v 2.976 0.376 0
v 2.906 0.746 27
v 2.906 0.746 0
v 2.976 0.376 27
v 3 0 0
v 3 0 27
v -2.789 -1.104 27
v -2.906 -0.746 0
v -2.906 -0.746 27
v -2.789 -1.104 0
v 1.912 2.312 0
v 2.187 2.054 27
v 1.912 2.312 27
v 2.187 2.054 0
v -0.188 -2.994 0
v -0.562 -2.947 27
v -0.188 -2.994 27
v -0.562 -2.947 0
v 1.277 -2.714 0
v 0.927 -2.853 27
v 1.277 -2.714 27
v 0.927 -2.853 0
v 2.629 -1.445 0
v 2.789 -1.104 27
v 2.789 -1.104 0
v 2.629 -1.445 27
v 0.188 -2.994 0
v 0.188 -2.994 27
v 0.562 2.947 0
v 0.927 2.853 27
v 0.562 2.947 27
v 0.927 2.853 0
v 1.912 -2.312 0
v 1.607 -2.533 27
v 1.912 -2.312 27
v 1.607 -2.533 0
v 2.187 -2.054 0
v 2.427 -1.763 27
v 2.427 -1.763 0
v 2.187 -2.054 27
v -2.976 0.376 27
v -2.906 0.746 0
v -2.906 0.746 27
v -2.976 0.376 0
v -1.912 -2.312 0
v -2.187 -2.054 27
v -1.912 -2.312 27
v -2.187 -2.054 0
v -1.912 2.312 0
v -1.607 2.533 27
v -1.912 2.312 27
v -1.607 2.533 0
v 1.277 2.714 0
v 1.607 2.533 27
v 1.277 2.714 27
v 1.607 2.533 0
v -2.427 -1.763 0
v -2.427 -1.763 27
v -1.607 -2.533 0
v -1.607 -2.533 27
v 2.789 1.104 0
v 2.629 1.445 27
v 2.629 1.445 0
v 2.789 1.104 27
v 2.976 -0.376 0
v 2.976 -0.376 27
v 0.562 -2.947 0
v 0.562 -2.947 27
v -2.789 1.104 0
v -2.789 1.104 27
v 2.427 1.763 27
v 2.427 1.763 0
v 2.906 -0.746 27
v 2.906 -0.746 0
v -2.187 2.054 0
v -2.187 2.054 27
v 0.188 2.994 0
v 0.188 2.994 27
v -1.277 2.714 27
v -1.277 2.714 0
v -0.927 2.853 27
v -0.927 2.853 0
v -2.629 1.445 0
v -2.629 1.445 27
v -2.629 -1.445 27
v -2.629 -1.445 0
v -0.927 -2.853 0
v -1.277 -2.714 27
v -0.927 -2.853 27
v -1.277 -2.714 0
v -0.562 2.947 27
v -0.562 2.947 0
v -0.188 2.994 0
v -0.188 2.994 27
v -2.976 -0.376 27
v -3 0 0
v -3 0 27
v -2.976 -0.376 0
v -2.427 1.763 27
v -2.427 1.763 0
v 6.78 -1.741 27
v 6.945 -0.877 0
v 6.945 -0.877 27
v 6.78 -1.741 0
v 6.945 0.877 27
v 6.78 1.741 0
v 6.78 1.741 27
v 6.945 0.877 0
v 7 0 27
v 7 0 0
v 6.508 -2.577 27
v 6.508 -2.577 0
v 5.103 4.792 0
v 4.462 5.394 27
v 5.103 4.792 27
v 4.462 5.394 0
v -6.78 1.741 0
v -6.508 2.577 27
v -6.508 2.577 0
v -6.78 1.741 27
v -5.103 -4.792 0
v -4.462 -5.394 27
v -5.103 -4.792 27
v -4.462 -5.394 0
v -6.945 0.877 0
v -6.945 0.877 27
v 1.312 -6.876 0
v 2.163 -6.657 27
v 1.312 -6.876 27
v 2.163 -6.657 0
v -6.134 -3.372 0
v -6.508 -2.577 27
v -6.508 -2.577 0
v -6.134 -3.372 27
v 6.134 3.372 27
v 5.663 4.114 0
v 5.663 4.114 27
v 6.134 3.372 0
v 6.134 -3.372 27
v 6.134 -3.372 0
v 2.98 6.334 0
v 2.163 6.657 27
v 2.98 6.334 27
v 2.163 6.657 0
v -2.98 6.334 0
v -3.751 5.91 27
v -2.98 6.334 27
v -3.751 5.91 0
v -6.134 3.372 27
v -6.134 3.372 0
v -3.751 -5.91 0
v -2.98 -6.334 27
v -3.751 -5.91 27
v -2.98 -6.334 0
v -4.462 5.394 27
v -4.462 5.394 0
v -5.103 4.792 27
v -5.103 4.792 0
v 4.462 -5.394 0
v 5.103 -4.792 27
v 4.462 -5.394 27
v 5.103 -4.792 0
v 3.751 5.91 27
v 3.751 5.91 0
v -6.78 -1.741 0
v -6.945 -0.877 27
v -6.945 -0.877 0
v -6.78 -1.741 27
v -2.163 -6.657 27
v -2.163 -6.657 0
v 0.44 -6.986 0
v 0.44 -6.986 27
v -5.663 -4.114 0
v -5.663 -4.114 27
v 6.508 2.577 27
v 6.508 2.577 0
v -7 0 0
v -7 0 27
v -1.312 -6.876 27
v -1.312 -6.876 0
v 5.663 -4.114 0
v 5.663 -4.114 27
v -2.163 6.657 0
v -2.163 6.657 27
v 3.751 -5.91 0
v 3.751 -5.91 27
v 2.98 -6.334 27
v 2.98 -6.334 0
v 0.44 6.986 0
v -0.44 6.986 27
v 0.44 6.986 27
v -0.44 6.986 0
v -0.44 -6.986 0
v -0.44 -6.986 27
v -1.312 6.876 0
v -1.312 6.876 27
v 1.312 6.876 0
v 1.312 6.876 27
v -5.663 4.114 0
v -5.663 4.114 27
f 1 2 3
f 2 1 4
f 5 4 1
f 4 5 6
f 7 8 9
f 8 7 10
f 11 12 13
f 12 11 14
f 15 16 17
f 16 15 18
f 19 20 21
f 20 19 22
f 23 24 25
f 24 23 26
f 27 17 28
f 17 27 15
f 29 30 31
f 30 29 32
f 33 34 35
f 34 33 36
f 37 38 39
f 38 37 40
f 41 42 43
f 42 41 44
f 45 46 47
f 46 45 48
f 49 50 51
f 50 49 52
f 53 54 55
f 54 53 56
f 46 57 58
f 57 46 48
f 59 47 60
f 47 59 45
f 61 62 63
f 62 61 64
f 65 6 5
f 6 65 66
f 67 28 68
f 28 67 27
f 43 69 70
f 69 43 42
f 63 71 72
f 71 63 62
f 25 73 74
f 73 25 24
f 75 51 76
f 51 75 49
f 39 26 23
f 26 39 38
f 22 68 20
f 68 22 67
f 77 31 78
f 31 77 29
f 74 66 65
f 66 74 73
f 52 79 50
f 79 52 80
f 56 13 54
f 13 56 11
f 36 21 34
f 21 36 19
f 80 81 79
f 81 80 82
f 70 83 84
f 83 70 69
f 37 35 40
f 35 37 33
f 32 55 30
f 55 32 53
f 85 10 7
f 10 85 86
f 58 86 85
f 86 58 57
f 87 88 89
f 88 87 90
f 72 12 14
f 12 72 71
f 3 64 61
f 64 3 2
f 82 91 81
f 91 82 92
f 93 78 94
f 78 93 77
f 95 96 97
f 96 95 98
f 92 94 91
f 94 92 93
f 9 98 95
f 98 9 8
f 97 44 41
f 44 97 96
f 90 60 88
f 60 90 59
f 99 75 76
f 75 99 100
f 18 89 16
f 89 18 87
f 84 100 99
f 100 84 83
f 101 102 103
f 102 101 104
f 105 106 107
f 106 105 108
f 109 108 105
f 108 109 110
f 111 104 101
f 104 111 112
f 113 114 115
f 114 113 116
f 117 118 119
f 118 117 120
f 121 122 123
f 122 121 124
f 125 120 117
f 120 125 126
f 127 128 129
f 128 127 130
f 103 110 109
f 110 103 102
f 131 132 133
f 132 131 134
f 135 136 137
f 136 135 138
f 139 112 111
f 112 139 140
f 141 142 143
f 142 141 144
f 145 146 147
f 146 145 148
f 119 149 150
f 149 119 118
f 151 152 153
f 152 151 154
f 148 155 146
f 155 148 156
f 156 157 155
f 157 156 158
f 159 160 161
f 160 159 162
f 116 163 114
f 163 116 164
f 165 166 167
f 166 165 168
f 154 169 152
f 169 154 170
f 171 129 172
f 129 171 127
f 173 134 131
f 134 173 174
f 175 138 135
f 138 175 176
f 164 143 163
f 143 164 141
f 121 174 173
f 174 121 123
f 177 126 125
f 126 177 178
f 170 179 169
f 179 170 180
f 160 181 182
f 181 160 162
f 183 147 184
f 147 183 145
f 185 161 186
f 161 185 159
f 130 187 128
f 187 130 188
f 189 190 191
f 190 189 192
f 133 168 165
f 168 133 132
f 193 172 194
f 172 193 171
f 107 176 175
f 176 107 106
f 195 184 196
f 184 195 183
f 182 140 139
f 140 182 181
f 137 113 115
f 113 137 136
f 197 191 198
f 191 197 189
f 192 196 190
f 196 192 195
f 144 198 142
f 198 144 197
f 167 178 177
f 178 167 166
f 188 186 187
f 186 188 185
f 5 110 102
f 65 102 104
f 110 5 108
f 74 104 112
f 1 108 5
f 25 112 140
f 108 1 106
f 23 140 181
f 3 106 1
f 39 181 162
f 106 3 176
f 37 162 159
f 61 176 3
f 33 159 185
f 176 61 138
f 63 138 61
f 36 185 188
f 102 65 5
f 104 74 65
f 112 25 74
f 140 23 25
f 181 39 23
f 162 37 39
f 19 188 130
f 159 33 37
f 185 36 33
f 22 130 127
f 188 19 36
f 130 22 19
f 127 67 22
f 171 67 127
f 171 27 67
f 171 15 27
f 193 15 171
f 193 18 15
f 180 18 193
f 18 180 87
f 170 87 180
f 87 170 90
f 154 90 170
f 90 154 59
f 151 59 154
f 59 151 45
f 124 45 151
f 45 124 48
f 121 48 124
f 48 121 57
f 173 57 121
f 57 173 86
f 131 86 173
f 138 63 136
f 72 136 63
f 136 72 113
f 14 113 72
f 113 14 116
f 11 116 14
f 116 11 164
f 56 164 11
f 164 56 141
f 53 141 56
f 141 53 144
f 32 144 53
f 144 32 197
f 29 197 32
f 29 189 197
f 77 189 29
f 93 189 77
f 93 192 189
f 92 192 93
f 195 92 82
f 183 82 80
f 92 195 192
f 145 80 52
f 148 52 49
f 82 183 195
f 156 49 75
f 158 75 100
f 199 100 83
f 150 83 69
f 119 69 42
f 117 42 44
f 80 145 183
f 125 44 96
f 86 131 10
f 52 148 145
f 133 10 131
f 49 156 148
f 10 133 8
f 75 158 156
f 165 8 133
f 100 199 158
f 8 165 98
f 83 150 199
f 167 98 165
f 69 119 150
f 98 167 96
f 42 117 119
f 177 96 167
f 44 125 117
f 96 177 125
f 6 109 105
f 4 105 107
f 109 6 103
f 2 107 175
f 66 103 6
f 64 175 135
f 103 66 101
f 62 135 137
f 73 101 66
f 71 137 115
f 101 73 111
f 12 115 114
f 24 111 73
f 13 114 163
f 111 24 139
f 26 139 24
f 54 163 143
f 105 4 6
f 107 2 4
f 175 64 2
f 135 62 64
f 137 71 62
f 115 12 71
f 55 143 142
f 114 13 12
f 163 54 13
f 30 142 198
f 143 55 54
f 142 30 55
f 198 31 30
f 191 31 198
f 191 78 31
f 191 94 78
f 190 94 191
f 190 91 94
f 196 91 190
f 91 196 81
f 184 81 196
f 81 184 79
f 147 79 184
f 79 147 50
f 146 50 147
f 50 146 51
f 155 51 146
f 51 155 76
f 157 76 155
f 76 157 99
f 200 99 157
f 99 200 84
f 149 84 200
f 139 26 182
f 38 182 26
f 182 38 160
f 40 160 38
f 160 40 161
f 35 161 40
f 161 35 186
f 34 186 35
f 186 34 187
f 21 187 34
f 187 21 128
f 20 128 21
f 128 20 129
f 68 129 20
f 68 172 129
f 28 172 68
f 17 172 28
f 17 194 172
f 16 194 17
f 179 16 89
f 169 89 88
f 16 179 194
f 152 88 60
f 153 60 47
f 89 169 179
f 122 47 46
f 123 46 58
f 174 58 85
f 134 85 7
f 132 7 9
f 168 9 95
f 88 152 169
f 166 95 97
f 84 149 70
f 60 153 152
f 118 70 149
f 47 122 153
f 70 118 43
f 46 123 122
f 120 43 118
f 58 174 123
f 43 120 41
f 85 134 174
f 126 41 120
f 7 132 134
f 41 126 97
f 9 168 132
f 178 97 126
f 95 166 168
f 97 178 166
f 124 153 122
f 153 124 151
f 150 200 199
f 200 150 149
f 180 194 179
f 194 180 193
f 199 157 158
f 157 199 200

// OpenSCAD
$fn = 50;

difference() {
	union() {
		cylinder(h = 27, r = 7.0);
	}
	union() {
		translate(v = [0, 0, -100]) {
			cylinder(h = 200, r = 3.0);
		}
		translate(v = [0, 0, -100]) {
			cylinder(h = 200, r = 1.5);
		}
	}
}
